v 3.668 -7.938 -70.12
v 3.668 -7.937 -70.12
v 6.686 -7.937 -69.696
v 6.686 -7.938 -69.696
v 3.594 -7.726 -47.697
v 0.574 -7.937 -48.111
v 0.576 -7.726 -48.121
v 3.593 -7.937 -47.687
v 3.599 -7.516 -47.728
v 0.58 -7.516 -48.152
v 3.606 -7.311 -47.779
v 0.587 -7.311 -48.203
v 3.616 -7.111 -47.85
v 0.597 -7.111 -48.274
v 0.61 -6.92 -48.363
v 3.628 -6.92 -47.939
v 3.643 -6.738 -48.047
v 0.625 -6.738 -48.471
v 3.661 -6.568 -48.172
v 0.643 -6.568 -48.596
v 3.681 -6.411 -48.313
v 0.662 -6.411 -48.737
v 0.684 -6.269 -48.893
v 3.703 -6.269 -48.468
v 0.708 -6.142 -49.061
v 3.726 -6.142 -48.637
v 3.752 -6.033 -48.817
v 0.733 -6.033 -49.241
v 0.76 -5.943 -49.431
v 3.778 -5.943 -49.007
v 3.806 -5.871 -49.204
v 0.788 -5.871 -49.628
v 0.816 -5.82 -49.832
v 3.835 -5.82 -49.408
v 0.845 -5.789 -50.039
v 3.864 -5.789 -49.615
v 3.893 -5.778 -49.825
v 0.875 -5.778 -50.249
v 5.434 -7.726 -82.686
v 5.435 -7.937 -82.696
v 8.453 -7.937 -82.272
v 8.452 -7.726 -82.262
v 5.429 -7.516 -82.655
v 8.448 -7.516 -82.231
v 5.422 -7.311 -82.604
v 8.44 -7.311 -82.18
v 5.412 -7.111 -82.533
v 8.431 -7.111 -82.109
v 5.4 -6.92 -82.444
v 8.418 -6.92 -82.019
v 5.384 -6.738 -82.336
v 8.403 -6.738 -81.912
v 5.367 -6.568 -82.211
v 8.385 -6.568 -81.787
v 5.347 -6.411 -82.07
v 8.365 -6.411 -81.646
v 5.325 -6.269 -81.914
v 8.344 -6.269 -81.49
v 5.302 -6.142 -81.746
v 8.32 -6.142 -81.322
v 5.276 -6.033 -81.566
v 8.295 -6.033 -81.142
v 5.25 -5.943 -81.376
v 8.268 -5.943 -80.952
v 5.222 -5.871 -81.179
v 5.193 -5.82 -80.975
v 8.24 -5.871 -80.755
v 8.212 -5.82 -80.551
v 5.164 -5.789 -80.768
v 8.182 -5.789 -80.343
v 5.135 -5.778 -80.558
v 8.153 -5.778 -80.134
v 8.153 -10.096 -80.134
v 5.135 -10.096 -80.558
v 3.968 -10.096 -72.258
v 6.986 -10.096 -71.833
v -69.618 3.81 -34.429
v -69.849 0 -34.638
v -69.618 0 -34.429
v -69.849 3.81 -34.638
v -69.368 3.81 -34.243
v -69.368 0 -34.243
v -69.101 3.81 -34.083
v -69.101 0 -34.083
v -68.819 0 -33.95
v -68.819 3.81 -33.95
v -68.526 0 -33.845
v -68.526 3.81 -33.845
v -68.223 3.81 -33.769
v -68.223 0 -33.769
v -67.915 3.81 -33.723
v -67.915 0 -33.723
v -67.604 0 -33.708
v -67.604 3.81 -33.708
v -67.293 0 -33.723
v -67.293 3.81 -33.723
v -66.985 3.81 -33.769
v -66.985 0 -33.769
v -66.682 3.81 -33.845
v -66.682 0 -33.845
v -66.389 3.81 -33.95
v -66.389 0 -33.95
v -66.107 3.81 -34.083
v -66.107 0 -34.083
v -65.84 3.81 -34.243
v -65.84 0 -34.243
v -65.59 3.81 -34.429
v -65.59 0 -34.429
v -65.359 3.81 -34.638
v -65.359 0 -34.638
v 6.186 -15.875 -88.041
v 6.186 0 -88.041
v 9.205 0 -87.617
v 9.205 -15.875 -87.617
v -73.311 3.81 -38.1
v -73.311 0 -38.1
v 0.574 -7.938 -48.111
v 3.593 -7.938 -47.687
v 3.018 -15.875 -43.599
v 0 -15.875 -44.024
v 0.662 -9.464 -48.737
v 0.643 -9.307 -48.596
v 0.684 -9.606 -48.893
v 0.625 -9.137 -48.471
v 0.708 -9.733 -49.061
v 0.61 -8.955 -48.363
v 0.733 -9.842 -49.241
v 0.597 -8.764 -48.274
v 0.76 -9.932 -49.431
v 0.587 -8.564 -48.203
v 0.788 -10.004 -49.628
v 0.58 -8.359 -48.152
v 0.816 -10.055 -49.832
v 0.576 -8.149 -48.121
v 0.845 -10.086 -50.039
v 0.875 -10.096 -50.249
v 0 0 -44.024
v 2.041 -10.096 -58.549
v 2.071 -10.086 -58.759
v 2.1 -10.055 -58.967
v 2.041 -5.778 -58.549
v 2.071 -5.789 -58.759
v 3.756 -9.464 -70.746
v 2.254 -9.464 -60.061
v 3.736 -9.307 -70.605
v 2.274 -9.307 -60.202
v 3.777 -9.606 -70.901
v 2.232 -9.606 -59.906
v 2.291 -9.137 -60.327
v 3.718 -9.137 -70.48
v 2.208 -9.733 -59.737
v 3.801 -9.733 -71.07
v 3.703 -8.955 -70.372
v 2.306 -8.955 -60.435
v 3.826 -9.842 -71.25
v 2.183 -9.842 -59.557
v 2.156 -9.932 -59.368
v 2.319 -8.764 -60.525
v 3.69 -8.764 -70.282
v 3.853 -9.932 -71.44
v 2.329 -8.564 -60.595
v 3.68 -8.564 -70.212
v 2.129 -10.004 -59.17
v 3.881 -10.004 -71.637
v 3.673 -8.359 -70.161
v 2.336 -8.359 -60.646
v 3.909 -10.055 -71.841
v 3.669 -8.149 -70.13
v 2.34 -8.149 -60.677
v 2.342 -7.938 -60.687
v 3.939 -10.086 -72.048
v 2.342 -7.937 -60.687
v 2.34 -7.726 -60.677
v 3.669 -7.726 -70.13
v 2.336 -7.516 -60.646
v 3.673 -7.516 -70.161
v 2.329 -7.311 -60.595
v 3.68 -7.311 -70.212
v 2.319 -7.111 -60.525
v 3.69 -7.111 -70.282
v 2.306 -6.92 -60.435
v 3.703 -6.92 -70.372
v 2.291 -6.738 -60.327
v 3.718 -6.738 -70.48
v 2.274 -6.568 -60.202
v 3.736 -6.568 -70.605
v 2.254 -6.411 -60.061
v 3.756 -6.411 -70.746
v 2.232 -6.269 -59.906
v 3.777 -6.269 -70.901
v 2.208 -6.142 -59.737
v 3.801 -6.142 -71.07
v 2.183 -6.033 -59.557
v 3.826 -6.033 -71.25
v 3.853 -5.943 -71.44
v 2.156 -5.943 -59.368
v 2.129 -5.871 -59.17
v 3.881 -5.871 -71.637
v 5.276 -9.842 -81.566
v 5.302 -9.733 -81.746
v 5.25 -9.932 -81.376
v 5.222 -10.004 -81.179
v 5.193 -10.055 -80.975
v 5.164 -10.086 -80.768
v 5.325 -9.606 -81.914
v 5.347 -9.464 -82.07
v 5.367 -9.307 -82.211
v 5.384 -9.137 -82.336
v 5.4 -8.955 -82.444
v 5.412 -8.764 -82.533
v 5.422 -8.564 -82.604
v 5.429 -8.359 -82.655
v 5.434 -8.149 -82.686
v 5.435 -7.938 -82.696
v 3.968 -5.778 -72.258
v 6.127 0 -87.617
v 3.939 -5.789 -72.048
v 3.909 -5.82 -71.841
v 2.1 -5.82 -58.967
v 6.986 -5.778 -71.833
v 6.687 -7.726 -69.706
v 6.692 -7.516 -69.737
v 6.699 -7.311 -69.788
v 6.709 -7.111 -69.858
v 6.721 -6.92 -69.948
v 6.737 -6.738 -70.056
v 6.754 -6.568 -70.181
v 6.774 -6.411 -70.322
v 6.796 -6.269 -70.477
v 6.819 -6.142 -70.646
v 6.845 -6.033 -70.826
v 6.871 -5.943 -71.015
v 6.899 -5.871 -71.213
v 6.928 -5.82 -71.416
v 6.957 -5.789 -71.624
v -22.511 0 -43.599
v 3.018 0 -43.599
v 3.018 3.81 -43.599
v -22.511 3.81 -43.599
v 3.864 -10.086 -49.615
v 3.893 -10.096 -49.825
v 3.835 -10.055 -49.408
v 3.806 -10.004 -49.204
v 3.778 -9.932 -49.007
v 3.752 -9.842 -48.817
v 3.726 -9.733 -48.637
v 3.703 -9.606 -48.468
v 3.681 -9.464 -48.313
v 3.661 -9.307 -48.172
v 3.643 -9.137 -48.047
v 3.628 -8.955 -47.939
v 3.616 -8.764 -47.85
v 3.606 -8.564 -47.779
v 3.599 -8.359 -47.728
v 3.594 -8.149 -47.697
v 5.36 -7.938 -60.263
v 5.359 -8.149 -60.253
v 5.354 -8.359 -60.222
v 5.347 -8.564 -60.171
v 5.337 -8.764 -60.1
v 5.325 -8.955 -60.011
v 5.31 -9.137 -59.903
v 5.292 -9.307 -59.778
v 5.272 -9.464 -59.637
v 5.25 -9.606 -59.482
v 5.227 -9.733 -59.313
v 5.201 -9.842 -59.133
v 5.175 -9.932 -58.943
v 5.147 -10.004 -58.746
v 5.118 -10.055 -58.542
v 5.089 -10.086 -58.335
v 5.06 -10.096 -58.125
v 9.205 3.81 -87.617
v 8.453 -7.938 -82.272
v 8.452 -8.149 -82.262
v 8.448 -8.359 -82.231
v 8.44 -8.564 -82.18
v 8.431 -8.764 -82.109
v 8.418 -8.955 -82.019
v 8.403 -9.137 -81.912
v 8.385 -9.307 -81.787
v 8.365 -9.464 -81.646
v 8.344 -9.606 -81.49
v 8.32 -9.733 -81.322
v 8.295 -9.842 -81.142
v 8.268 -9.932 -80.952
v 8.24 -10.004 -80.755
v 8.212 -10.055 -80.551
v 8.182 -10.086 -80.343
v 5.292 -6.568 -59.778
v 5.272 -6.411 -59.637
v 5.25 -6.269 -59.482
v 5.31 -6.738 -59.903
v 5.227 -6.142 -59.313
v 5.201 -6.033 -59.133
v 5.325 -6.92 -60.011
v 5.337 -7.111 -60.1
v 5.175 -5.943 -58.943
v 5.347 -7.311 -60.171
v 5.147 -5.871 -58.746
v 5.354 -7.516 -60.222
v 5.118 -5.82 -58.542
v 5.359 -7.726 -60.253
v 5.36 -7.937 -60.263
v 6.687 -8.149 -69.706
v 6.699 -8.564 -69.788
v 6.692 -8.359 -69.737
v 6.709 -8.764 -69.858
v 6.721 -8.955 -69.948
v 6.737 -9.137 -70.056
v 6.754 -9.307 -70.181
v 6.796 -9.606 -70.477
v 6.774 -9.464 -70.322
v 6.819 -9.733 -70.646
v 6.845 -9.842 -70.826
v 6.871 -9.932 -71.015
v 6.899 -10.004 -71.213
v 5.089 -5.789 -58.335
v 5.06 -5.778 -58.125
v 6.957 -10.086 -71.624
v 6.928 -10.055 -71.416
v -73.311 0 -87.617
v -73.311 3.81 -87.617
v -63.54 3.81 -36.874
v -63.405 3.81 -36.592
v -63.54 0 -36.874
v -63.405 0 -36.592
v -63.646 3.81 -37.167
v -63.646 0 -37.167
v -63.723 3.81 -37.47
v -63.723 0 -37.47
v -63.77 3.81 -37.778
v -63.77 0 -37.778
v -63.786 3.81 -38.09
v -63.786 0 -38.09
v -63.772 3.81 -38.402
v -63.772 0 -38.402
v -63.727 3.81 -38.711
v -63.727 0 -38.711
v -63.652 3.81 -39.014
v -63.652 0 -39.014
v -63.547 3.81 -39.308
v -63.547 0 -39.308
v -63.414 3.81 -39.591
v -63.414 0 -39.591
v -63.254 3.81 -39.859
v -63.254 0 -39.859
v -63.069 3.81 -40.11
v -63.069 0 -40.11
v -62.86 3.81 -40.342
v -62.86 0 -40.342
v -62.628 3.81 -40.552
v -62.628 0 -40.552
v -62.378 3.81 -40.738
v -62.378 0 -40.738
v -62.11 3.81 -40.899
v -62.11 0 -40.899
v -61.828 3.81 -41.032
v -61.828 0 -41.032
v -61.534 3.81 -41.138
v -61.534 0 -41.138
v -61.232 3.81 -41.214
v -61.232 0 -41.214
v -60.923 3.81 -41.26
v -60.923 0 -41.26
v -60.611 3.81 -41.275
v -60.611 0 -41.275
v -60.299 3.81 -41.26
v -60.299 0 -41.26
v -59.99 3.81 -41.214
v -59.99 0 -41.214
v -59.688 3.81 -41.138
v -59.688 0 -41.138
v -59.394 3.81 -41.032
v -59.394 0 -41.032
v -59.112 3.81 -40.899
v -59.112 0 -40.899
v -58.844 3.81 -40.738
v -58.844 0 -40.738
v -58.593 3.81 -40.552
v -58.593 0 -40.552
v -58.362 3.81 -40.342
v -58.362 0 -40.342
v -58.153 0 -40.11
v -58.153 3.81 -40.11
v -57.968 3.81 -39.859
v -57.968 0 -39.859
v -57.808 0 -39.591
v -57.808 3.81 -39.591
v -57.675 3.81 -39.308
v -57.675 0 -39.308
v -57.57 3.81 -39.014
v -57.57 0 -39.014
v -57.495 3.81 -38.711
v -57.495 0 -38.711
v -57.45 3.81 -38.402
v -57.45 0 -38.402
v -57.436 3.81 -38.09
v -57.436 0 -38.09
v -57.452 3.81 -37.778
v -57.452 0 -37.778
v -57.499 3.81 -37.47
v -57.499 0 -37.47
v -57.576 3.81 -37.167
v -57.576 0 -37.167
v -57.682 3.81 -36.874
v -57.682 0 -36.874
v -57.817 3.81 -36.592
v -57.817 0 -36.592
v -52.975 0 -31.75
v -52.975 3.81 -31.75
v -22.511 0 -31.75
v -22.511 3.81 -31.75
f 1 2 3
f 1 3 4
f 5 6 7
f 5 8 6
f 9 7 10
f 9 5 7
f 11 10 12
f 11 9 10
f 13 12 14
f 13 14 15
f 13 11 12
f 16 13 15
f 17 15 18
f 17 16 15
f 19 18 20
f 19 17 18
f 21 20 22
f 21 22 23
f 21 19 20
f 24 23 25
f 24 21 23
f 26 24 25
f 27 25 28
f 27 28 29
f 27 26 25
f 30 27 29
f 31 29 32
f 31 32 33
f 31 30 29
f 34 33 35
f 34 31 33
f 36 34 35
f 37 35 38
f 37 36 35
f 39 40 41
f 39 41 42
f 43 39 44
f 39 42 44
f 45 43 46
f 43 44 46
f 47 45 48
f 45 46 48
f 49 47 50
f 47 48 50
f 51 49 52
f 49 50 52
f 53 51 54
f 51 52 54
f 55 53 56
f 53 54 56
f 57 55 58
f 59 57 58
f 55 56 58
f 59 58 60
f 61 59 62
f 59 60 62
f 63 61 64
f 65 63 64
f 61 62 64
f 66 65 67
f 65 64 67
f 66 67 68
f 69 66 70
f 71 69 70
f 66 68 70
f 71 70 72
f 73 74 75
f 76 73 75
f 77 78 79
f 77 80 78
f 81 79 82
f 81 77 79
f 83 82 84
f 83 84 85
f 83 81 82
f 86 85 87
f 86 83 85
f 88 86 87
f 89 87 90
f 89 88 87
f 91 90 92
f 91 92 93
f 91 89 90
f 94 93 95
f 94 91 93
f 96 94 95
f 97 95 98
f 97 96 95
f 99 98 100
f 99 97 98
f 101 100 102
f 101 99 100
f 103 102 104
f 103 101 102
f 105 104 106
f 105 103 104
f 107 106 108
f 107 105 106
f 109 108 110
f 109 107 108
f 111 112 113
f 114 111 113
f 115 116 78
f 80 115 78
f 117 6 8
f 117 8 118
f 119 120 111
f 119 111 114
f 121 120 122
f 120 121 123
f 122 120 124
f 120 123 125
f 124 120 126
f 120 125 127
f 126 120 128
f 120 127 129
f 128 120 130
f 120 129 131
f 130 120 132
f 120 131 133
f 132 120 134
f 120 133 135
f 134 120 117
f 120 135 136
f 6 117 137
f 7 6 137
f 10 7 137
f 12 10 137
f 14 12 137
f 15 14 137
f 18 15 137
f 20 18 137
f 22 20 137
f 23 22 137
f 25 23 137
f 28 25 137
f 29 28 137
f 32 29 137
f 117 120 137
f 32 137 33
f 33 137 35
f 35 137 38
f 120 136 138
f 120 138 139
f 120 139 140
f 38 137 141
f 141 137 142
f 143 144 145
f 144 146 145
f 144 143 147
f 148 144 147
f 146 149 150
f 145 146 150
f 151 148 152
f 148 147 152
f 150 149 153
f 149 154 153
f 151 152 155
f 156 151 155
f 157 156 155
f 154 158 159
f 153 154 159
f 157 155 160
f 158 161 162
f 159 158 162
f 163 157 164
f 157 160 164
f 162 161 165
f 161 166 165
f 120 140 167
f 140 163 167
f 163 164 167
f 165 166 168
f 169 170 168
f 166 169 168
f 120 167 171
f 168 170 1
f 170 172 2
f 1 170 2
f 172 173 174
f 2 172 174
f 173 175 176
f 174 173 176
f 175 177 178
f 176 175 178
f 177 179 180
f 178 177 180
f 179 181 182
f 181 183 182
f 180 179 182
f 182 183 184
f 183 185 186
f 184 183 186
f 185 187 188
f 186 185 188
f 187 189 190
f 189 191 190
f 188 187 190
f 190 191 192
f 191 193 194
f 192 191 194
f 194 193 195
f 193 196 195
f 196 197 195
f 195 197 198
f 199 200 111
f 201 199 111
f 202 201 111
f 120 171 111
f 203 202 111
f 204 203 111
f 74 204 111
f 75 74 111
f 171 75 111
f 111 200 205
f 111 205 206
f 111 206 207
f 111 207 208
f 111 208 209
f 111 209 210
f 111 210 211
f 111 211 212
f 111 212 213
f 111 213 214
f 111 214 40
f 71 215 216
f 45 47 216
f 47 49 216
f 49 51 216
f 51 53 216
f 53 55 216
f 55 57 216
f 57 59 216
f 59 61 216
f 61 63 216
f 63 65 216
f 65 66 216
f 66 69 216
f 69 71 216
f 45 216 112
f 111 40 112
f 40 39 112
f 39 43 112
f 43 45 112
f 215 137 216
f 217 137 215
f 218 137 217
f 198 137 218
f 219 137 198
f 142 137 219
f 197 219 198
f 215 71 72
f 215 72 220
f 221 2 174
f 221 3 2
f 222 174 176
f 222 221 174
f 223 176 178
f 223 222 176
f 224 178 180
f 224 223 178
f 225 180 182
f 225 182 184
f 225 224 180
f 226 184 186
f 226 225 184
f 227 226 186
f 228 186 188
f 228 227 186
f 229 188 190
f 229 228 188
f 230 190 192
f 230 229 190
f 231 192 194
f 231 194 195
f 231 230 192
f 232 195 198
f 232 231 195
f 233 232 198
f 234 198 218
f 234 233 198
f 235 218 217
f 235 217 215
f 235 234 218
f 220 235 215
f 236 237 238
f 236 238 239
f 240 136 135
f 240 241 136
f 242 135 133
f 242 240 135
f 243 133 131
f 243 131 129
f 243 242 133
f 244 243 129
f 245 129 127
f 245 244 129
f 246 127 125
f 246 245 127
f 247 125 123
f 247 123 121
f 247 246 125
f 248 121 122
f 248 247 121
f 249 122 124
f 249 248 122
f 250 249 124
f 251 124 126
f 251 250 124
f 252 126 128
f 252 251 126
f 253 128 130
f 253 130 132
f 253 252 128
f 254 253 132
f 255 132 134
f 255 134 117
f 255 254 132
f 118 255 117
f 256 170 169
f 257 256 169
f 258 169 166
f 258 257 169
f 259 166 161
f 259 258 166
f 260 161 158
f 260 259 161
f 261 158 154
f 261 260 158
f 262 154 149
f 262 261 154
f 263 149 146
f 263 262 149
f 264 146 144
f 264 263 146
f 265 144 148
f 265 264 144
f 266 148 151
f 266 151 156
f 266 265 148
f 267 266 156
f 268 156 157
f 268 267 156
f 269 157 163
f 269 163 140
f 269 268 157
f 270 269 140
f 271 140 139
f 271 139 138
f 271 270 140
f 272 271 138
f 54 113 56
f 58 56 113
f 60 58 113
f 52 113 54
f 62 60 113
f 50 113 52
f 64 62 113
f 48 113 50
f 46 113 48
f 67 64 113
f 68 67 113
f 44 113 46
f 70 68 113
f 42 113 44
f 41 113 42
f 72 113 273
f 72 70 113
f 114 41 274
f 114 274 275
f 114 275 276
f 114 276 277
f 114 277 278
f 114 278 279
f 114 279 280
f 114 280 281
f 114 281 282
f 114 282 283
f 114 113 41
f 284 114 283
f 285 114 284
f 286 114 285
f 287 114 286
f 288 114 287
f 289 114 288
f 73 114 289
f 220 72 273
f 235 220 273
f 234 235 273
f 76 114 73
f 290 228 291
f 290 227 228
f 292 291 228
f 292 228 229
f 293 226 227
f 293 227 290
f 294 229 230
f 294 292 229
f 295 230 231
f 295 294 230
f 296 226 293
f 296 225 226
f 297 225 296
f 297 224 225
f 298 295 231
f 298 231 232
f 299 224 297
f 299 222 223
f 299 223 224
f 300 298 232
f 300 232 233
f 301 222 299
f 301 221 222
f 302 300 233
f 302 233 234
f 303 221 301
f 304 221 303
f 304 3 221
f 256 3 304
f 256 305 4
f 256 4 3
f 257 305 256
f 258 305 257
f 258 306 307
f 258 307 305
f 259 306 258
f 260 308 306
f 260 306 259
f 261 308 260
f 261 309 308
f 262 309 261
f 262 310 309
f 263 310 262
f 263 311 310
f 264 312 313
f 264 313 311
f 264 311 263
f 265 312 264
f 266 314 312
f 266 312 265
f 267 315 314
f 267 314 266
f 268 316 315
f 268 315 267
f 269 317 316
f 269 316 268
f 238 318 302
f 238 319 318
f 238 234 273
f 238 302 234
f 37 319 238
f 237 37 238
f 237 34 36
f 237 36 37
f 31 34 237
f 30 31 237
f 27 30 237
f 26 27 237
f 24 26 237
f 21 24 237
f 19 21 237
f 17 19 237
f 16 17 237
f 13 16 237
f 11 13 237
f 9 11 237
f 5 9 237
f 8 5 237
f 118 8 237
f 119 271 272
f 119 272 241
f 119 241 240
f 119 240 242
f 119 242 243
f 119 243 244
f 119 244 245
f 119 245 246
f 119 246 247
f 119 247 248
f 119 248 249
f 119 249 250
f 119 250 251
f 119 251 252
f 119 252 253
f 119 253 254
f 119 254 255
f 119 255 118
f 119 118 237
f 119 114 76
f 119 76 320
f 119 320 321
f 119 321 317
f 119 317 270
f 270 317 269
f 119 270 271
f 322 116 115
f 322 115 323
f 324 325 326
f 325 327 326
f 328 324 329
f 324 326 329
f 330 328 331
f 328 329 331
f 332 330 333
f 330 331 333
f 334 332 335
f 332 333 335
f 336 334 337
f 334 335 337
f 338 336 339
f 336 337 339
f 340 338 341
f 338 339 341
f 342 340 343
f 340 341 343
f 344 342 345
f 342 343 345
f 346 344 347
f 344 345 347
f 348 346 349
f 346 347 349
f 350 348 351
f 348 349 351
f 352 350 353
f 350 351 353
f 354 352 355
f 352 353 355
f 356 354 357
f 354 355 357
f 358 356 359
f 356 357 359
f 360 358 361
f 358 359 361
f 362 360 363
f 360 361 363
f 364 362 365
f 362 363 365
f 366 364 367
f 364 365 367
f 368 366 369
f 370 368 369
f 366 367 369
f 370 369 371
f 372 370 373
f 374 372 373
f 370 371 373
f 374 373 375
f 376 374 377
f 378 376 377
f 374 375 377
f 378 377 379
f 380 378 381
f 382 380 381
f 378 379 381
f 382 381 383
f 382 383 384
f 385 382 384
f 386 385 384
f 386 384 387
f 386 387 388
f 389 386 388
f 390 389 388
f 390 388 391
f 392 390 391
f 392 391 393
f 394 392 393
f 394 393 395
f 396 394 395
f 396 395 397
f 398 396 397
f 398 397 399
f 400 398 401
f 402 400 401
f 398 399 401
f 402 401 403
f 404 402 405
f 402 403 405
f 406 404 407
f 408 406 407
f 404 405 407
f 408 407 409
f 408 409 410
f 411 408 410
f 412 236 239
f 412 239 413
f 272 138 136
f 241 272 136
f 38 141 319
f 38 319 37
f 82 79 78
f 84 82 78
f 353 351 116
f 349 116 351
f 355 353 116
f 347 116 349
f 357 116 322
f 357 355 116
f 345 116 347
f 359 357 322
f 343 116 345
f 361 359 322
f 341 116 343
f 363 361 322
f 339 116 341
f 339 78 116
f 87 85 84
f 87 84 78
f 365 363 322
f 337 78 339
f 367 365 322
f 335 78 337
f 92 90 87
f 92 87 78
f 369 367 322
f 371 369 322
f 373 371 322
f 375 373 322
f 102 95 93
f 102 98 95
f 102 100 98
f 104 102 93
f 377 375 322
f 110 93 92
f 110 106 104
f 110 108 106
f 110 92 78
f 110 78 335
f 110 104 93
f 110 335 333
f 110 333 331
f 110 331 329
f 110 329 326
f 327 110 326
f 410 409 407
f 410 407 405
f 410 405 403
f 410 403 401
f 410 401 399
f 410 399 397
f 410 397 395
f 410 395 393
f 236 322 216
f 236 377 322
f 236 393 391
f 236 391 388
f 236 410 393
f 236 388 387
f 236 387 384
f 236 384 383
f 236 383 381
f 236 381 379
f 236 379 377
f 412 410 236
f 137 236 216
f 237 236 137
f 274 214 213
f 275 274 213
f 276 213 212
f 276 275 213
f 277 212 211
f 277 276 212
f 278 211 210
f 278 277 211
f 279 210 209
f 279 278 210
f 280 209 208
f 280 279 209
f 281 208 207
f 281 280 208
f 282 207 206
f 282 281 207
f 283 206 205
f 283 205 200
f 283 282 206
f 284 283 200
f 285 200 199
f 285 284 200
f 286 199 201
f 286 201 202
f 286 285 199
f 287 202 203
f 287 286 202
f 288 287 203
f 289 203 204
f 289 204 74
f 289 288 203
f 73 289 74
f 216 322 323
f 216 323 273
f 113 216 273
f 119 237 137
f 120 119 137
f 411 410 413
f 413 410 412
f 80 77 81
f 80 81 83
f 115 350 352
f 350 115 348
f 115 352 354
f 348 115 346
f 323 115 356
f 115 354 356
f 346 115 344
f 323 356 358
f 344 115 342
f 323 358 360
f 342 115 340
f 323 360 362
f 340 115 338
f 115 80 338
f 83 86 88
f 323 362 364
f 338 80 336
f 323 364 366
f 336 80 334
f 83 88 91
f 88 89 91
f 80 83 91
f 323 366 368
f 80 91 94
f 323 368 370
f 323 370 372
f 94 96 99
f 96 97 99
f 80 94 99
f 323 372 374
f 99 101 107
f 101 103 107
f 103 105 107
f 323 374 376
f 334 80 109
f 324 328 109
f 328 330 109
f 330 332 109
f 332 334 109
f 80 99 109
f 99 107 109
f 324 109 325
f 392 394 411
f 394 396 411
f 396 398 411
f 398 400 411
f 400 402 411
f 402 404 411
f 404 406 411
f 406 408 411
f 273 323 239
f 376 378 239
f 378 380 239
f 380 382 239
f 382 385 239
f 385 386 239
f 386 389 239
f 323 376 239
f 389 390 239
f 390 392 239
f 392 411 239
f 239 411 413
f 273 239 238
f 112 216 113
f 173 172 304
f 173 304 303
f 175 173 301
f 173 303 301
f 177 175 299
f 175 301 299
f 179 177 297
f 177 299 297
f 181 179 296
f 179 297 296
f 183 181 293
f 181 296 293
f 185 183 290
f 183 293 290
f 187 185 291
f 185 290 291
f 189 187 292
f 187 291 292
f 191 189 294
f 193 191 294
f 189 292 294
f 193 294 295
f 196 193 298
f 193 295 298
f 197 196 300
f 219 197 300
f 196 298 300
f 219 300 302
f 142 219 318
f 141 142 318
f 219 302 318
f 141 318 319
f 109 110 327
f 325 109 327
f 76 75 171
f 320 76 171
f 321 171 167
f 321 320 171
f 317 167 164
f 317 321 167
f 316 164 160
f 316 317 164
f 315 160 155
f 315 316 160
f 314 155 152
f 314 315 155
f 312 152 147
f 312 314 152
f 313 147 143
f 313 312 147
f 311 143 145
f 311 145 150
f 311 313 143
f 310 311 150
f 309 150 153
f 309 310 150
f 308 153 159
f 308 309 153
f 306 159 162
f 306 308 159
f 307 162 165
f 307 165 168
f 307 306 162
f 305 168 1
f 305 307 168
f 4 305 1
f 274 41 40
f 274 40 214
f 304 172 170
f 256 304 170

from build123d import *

# Parameters (mm, degrees)
F1_DEPTH  = 15.875
F2_W      = 4.318
F2_H      = 12.7
F3_DEPTH  = 9.175040233
F4_R      = 2.15899
F5_R      = 3.175
F6_DEPTH  = 3.81
F8_DEPTH  = 25.4
F10_DEPTH = 25.4
F11_R     = 3.175


# Not quite as in the source:
# - a fillet or chamfer is up to 0.001 mm smaller than in the source, because OpenCascade refuses the exact size


with BuildPart() as f1:
    # F0 (on Front) → F1 (new body)
    with BuildSketch(Plane.XZ):
        Polygon((9.2045814112, -87.6168819653), (3.0183370735, -43.5994663098), (0, -44.0236659215), (6.1862443377, -88.041081577), align=None)
    extrude(amount=F1_DEPTH)

    # F2 (on face) → F3 (cut, through all)
    with BuildSketch(Plane(origin=(-6.067283434, 0, -0.8527010782), x_dir=(0, -1, 0), z_dir=(-0.9902680687, 0, -0.139173101))):
        with Locations((7.9375, -54.072730631)):
            Rectangle(F2_W, F2_H)
        with Locations((7.9375, -76.297730631)):
            Rectangle(F2_W, F2_H)
    extrude(amount=-F3_DEPTH, mode=Mode.SUBTRACT)

    # F4 (radius 2.159 in the source; OpenCascade refuses exactly that, so slightly less here)
    f4_edges = [f1.edges().sort_by_distance(p)[0] for p in [
        (2.083606, -5.7785, -47.898898),
        (5.176728, -5.7785, -69.907605),
        (5.176728, -10.0965, -69.907605),
        (2.083606, -10.0965, -47.898898),
        (3.851104, -10.0965, -60.475302),
        (6.944226, -10.0965, -82.48401),
        (6.944226, -5.7785, -82.48401),
        (3.851104, -5.7785, -60.475302),
    ]]
    fillet(f4_edges, radius=F4_R)

    # F5 (on Front) → F6 (join)
    with BuildSketch(Plane.XZ):
        Polygon((9.2045814112, -87.6168819653), (3.0183370735, -43.5994663098), (-22.5109767612, -43.5994663098), (-22.5109767612, -25.4), (-73.3109767612, -25.4), (-73.3109767612, -87.6168819653), align=None)
        with Locations((-60.6109767612, -38.1)):
            Circle(F5_R, mode=Mode.SUBTRACT)
    extrude(amount=-F6_DEPTH)

    # F7 (on Front) → F8 (cut)
    with BuildSketch(Plane.XZ):
        Polygon((-73.3109767612, -38.1), (-60.6109767612, -25.4), (-73.3109767612, -25.4), align=None)
    extrude(amount=-F8_DEPTH, mode=Mode.SUBTRACT)

    # F9 (on Front) → F10 (cut)
    with BuildSketch(Plane.XZ):
        Polygon((-74.5969353161, -25.4), (-60.6109767612, -39.3859585549), (-52.9750182062, -31.75), (-22.5109767612, -31.75), (-22.5109767612, -25.4), align=None)
    extrude(amount=-F10_DEPTH, mode=Mode.SUBTRACT)

    # F11
    f11_edges = [f1.edges().sort_by_distance(p)[0] for p in [
        (-67.603956, 1.905, -32.392979),
    ]]
    fillet(f11_edges, radius=F11_R)


solid = f1.part
